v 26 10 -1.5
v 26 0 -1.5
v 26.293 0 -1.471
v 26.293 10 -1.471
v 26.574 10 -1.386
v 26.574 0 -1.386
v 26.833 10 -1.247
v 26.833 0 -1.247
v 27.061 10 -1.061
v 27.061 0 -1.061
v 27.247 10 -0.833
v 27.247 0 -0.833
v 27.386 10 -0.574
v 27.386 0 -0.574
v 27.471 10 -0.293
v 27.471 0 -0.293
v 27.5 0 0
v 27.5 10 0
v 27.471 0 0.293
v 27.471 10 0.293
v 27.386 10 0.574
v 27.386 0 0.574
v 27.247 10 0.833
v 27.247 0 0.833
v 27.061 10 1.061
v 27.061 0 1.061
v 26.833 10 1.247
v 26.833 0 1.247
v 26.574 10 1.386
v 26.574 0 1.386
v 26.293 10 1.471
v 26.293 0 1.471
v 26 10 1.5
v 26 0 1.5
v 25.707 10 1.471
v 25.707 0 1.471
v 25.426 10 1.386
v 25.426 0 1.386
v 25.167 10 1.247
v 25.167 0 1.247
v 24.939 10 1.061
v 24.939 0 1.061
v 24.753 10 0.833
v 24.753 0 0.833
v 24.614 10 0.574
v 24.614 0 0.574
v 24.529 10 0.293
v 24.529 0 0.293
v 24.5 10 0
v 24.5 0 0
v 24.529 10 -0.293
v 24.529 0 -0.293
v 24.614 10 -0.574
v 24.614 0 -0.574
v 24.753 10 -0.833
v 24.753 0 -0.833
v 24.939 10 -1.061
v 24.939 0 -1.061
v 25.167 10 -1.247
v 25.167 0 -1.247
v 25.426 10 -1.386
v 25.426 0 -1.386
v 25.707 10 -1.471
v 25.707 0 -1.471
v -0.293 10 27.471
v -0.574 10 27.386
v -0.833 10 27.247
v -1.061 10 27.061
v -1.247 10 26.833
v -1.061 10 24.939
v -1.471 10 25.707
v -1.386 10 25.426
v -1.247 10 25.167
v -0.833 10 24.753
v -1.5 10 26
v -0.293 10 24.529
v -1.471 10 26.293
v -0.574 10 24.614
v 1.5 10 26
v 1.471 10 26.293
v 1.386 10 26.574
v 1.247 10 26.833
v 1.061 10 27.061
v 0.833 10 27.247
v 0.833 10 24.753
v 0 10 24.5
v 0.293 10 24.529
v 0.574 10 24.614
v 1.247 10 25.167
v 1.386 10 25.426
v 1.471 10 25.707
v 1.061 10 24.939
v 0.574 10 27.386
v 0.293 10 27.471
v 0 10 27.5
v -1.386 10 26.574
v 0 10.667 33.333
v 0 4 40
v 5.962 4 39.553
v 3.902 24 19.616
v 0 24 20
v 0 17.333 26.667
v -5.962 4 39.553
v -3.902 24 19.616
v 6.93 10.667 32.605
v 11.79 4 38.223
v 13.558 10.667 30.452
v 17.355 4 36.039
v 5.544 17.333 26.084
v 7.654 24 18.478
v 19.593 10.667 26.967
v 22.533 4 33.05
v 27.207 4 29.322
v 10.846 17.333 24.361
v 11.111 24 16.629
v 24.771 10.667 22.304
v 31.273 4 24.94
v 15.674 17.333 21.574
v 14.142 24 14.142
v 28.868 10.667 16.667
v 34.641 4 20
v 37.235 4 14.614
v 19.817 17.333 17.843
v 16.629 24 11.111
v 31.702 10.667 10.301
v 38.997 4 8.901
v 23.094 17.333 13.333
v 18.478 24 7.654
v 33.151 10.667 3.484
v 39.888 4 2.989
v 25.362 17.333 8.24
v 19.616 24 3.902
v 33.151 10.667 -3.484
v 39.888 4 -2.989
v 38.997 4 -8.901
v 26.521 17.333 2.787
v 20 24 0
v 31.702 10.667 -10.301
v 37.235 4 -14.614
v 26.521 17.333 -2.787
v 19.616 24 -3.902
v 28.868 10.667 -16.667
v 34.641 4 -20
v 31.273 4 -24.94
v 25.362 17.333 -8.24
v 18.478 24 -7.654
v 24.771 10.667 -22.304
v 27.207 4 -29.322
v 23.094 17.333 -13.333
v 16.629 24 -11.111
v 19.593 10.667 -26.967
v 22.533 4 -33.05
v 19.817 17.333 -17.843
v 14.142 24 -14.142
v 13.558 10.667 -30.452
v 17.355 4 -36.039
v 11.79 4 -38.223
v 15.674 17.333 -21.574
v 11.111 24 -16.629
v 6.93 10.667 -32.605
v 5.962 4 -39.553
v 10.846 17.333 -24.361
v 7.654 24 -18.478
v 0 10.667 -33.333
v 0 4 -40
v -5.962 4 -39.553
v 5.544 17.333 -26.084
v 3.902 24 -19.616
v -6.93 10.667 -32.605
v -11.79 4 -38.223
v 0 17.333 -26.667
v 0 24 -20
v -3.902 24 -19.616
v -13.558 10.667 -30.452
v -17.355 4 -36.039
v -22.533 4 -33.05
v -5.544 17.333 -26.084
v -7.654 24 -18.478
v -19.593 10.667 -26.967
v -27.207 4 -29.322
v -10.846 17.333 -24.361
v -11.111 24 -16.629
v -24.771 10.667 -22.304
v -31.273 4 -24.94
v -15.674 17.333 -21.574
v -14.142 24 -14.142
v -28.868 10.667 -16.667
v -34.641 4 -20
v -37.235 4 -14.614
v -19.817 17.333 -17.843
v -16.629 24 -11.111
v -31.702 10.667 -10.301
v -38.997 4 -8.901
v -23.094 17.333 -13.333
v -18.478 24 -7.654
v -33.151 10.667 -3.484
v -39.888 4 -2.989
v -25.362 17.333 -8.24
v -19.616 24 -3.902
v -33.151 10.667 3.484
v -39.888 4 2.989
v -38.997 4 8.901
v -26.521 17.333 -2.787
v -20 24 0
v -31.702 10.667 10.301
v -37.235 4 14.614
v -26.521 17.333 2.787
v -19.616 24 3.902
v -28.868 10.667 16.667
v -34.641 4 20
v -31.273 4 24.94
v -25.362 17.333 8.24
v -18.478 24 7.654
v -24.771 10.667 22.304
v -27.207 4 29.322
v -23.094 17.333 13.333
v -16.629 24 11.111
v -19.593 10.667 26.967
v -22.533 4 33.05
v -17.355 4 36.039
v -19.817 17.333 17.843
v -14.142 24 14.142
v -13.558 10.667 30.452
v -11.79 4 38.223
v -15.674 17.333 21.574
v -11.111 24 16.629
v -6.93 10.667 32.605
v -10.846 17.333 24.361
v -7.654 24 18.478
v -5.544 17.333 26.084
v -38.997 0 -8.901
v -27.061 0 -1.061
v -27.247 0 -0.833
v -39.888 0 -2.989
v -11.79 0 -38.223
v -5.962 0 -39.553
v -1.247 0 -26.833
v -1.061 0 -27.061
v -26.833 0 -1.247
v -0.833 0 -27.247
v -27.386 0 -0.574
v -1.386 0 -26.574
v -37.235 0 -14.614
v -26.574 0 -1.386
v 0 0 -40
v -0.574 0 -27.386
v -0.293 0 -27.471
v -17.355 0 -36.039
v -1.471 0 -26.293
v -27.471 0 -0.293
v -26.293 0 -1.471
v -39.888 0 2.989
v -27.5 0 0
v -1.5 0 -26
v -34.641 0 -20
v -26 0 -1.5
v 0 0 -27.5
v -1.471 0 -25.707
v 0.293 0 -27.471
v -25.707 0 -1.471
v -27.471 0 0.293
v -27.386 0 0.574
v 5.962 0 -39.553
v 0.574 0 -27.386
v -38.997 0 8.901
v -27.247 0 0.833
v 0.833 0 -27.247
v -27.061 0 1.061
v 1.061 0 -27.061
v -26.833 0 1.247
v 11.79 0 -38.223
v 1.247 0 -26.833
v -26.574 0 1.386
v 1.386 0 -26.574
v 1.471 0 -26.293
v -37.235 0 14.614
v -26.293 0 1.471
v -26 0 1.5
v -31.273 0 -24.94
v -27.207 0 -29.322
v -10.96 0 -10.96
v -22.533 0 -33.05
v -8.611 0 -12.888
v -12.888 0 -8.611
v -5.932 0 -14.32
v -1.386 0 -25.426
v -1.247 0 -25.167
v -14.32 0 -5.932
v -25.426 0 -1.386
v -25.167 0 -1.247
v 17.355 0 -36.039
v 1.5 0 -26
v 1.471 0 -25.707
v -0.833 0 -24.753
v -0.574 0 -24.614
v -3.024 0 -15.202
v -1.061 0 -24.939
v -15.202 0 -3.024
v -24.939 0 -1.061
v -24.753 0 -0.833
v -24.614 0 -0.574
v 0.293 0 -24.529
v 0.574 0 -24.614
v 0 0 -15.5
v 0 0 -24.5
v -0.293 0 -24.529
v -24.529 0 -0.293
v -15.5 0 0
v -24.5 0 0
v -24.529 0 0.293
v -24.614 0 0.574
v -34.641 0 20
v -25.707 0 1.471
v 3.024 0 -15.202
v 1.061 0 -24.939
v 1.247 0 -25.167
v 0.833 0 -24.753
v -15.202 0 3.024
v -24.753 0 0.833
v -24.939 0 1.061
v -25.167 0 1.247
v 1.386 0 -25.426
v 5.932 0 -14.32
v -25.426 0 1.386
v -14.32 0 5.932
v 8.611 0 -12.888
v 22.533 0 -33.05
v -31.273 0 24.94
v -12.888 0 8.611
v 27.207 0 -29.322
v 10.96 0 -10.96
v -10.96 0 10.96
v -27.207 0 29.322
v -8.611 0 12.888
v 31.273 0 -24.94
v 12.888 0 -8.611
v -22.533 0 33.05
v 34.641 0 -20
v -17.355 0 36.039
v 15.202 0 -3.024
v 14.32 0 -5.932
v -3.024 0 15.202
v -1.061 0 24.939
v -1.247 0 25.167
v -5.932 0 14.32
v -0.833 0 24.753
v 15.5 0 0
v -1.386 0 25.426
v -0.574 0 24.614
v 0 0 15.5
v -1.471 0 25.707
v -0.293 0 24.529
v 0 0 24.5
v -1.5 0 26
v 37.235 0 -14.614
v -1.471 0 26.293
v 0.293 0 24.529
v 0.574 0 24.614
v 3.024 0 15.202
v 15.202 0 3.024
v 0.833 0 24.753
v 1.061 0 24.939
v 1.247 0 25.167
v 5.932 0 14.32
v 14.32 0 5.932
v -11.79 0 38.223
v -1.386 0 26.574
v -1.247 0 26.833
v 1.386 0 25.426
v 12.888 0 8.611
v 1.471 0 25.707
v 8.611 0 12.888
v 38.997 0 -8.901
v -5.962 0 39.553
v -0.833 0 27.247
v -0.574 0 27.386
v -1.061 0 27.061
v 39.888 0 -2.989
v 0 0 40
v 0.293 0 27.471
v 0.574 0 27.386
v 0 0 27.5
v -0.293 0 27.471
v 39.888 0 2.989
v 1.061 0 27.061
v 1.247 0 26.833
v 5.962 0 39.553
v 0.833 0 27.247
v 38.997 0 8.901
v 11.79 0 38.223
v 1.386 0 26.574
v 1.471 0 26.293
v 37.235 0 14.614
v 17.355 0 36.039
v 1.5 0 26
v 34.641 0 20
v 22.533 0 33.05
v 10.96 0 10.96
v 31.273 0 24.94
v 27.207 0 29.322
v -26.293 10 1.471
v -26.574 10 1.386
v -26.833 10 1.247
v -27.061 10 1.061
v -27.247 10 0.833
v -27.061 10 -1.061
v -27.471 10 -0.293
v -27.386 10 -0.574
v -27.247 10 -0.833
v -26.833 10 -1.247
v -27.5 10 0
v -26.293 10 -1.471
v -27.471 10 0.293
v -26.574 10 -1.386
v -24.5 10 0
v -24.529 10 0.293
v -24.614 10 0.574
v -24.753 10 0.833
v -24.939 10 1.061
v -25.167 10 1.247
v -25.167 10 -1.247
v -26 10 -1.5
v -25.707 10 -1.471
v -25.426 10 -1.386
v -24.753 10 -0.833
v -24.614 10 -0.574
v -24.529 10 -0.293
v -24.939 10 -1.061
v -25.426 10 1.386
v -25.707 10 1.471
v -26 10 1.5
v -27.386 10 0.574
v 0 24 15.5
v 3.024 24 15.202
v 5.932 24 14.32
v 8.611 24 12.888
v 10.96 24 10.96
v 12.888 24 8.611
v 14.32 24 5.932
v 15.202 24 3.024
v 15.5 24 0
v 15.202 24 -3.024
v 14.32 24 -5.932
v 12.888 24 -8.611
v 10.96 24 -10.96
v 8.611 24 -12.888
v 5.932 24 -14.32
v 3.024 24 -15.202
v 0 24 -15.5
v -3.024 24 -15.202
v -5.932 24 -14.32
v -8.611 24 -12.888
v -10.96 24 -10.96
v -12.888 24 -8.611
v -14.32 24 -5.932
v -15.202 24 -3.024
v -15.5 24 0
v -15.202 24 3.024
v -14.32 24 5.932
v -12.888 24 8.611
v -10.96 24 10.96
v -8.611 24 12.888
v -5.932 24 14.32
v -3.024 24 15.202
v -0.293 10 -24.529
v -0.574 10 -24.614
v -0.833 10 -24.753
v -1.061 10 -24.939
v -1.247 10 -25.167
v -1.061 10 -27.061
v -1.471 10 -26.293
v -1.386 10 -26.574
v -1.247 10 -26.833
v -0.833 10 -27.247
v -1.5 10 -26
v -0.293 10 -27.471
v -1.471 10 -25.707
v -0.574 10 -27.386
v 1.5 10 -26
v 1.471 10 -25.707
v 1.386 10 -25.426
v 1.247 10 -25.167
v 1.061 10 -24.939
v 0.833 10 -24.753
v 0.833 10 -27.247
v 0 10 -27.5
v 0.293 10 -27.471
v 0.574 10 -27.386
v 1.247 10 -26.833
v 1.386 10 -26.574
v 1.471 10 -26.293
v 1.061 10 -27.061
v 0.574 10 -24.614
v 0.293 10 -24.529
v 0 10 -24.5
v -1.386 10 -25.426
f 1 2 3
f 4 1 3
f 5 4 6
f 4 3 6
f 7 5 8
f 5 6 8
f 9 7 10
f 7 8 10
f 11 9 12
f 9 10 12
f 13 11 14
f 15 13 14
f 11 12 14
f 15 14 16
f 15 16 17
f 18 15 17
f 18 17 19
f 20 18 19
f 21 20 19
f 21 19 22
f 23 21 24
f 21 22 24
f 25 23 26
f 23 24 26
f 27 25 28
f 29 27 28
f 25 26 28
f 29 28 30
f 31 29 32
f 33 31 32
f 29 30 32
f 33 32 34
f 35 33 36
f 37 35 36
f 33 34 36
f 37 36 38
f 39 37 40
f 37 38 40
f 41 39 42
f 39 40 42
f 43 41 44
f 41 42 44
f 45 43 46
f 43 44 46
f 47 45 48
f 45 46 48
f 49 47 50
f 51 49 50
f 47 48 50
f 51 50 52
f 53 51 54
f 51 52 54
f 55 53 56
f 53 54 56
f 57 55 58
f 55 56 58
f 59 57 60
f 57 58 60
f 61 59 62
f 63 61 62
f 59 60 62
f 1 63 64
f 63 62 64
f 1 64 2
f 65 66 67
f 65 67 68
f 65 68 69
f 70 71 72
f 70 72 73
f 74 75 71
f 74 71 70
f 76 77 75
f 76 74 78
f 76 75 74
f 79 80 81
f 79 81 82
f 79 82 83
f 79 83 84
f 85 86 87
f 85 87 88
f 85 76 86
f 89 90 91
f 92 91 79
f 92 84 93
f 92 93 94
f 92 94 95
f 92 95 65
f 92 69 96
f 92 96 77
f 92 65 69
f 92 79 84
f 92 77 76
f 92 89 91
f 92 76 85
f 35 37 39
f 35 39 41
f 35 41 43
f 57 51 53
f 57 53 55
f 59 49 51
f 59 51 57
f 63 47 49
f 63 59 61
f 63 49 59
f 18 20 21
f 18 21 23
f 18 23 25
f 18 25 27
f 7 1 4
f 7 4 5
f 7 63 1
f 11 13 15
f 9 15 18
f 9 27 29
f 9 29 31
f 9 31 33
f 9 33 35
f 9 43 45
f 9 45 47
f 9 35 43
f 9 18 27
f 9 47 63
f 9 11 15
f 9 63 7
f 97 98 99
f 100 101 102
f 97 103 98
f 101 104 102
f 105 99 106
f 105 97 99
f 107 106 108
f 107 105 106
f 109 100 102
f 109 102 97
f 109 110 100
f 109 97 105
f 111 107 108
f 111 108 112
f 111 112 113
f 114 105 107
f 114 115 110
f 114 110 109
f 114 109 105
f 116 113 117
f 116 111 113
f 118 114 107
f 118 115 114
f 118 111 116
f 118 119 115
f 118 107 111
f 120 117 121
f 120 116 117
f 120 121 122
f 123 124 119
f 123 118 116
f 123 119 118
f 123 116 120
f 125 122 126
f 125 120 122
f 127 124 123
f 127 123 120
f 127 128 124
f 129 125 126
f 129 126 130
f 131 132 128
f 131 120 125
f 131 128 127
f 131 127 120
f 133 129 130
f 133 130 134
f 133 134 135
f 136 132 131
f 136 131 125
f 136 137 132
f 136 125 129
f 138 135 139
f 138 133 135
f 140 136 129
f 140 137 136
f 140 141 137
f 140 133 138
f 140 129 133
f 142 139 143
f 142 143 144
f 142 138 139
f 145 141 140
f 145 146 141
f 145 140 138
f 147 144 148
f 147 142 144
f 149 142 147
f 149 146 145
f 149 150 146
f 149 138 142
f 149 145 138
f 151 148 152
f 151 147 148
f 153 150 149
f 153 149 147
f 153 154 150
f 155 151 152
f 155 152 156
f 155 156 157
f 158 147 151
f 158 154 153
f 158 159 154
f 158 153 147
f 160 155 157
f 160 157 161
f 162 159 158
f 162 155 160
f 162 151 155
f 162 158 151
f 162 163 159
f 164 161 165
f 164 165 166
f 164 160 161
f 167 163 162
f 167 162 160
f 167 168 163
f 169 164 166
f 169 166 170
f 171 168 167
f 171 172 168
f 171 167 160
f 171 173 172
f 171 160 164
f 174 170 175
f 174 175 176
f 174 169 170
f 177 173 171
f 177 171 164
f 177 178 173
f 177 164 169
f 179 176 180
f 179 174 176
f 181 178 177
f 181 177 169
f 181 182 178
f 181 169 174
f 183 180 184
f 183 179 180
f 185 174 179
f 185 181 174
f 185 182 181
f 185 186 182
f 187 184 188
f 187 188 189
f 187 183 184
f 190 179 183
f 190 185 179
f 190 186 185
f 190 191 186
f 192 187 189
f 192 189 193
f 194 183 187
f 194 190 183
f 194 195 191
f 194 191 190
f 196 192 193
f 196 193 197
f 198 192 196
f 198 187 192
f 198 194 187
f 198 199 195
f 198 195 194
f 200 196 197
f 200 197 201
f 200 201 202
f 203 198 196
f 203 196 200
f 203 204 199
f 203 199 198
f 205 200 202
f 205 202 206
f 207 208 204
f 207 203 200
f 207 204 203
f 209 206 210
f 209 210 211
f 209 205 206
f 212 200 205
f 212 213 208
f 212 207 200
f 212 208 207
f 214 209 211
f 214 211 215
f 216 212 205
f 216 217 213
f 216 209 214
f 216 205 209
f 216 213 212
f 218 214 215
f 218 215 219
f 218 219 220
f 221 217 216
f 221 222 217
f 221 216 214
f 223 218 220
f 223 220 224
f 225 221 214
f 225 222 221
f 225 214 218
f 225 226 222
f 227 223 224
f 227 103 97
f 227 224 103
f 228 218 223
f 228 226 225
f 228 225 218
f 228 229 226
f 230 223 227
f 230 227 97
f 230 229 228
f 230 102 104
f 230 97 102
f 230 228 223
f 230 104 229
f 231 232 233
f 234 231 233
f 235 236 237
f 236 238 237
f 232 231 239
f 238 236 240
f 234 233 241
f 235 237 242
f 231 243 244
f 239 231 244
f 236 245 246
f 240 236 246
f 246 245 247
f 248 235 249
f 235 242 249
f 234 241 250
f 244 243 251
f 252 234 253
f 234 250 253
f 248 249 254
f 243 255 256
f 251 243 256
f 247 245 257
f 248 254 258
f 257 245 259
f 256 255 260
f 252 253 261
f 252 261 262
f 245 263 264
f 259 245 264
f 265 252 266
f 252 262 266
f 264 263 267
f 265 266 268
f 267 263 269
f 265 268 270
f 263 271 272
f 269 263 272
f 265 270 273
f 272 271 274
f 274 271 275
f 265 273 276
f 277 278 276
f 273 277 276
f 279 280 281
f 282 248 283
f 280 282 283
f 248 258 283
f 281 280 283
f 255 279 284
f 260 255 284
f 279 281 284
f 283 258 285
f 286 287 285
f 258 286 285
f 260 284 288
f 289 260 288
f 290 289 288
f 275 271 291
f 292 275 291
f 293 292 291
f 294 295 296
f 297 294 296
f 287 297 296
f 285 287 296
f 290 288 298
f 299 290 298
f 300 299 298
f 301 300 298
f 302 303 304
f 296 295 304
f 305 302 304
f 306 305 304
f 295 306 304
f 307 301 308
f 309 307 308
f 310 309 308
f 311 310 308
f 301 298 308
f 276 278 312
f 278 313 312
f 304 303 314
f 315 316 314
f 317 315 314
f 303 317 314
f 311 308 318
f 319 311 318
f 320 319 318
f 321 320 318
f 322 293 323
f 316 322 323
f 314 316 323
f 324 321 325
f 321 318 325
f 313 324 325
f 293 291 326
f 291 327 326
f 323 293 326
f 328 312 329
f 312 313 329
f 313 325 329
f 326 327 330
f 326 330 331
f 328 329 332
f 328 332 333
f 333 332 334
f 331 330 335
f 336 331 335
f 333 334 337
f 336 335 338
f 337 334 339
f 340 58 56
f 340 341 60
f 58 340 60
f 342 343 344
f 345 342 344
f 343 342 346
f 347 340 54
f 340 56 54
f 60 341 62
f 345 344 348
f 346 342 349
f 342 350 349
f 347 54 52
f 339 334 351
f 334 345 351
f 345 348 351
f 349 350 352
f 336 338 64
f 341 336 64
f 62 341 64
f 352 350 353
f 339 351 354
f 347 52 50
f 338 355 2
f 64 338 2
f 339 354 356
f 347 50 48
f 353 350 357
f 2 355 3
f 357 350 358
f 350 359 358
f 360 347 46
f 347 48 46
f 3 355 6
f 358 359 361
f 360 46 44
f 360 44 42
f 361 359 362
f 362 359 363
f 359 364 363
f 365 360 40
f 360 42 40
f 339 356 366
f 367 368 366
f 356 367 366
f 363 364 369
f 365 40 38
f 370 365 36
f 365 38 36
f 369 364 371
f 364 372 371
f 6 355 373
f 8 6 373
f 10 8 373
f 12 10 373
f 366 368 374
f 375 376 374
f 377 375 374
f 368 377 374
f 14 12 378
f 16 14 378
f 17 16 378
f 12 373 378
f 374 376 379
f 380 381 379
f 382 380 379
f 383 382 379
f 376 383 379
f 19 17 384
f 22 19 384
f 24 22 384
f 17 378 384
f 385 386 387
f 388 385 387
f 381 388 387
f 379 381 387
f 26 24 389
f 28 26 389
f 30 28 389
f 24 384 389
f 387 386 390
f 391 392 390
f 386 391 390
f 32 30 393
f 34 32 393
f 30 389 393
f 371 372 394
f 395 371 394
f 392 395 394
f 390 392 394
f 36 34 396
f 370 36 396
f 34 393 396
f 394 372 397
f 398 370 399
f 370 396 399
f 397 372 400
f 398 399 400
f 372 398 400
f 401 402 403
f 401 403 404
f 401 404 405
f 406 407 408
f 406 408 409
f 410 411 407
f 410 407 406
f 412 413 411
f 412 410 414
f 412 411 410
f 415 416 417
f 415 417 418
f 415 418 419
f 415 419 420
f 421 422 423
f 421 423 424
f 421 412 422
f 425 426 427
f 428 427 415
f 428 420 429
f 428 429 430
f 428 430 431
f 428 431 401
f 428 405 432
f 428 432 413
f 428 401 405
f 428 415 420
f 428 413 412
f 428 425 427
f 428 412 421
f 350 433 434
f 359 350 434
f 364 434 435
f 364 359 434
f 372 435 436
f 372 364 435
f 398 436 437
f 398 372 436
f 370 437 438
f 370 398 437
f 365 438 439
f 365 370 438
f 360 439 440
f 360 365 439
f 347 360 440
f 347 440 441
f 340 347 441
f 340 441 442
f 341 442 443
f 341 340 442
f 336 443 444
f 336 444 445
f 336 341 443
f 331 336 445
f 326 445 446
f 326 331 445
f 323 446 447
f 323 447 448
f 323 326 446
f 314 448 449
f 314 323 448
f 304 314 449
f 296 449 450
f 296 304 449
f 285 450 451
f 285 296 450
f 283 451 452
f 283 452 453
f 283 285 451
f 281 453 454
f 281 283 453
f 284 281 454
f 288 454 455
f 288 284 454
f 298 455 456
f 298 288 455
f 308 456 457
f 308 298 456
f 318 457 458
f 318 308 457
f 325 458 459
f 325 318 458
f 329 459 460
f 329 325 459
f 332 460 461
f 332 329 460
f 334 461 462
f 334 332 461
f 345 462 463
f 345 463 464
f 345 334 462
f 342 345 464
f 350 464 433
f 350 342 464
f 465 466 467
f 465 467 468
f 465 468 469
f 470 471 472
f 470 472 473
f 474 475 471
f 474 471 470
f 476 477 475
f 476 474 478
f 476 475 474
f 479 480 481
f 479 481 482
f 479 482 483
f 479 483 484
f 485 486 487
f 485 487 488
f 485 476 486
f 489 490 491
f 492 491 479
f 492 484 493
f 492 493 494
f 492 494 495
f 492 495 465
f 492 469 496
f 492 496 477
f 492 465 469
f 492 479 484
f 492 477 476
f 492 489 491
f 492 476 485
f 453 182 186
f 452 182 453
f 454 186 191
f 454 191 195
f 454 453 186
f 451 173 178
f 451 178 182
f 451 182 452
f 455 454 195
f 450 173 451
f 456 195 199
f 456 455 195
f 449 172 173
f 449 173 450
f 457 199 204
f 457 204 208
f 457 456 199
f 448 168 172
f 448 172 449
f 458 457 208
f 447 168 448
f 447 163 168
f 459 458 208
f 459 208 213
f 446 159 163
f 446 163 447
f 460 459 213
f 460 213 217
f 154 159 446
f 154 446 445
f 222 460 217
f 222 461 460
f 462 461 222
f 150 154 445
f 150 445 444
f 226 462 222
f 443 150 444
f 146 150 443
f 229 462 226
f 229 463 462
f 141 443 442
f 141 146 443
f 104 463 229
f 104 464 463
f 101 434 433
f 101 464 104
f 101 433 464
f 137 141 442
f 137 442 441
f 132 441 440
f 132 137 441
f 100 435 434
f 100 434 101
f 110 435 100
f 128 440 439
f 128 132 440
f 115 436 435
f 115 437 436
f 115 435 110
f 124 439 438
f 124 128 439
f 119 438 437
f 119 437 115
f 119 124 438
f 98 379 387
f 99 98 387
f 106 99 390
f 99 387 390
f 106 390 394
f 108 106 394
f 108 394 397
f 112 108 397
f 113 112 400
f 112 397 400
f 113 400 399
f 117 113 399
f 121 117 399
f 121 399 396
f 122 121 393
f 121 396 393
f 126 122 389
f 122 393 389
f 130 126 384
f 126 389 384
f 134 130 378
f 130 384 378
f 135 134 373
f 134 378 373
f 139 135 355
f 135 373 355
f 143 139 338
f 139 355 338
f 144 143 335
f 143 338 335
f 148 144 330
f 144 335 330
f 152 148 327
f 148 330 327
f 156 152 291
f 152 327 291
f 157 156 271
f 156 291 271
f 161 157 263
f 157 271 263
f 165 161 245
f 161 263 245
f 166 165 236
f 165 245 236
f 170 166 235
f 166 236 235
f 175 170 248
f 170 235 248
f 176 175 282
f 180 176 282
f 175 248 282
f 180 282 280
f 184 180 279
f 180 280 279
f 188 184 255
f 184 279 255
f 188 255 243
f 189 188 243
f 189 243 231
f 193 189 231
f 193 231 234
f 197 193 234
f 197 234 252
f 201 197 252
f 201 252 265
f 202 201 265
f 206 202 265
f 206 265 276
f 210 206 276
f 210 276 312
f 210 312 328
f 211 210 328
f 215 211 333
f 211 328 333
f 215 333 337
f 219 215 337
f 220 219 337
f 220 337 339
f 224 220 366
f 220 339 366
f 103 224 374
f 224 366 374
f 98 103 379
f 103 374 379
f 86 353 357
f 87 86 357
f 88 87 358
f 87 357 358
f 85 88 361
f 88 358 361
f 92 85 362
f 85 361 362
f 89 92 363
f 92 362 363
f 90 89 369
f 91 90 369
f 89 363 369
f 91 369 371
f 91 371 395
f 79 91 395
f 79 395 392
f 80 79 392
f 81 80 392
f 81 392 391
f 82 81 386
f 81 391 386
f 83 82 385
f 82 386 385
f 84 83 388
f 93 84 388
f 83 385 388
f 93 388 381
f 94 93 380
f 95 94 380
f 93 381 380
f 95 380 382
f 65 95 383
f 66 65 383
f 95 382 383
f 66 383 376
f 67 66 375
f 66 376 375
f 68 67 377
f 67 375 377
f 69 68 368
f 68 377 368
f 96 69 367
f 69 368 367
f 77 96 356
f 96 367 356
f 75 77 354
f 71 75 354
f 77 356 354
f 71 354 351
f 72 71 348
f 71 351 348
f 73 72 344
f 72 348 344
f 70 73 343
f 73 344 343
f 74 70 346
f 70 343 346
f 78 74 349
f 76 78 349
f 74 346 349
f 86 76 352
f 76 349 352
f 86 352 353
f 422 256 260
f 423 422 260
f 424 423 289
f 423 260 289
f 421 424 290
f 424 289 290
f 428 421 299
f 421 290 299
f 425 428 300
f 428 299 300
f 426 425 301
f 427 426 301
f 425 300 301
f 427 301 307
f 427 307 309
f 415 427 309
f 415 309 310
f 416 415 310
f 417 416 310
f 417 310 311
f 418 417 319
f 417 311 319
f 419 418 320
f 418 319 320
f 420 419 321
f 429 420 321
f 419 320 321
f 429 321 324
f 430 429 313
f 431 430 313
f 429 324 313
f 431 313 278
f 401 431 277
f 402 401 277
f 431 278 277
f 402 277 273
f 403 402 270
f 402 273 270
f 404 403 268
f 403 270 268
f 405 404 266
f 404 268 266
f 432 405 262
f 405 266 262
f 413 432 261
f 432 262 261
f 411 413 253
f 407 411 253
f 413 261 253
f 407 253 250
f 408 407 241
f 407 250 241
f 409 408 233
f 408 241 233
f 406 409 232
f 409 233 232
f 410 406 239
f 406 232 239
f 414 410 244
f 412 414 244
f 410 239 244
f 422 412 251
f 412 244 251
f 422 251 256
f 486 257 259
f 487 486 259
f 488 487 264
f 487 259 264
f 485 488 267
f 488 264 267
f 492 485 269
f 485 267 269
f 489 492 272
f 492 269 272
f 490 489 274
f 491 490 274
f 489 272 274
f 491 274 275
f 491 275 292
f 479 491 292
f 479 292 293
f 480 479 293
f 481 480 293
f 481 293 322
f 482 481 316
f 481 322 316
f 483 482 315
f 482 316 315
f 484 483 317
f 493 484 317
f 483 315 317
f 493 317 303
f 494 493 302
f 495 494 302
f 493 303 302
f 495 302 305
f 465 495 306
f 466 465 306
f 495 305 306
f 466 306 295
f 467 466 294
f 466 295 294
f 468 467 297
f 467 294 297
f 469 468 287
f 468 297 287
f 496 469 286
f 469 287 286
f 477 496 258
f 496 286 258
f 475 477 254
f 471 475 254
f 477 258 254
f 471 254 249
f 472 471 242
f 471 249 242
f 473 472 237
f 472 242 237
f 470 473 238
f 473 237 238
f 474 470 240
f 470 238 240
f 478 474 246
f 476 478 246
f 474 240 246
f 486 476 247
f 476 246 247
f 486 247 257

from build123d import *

# Parameters (mm, degrees)
SKETCH1_R           = 40
SKETCH1_R_2         = 15.5
BOSS_EXTRUDE1_DEPTH = 24
CHAMFER1_SIZE       = 20
SKETCH2_R           = 1.5
CUT_EXTRUDE1_DEPTH  = 10


with BuildPart() as part:
    # Sketch1 → Boss-Extrude1 (new body)
    with BuildSketch(Plane(origin=(0, 0, 0), x_dir=(1, 0, 0), z_dir=(0, 1, 0))):
        with Locations(Location((0, 0, 0), (0, 0, 270))):
            Circle(SKETCH1_R)
        with Locations(Location((0, 0, 0), (0, 0, 270))):
            Circle(SKETCH1_R_2, mode=Mode.SUBTRACT)
    extrude(amount=BOSS_EXTRUDE1_DEPTH)

    # Chamfer1
    chamfer1_edges = [part.edges().sort_by_distance(p)[0] for p in [
        (0, 24, -40),
    ]]
    chamfer(chamfer1_edges, length=CHAMFER1_SIZE)

    # Sketch2 → Cut-Extrude1 (cut)
    with BuildSketch(Plane.XZ):
        with Locations(Location((0, 26, 0), (0, 0, 270))):
            Circle(SKETCH2_R)
        with Locations(Location((26, 0, 0), (0, 0, 270))):
            Circle(SKETCH2_R)
        with Locations(Location((0, -26, 0), (0, 0, 270))):
            Circle(SKETCH2_R)
        with Locations(Location((-26, 0, 0), (0, 0, 270))):
            Circle(SKETCH2_R)
    extrude(amount=-CUT_EXTRUDE1_DEPTH, mode=Mode.SUBTRACT)


solid = part.part
